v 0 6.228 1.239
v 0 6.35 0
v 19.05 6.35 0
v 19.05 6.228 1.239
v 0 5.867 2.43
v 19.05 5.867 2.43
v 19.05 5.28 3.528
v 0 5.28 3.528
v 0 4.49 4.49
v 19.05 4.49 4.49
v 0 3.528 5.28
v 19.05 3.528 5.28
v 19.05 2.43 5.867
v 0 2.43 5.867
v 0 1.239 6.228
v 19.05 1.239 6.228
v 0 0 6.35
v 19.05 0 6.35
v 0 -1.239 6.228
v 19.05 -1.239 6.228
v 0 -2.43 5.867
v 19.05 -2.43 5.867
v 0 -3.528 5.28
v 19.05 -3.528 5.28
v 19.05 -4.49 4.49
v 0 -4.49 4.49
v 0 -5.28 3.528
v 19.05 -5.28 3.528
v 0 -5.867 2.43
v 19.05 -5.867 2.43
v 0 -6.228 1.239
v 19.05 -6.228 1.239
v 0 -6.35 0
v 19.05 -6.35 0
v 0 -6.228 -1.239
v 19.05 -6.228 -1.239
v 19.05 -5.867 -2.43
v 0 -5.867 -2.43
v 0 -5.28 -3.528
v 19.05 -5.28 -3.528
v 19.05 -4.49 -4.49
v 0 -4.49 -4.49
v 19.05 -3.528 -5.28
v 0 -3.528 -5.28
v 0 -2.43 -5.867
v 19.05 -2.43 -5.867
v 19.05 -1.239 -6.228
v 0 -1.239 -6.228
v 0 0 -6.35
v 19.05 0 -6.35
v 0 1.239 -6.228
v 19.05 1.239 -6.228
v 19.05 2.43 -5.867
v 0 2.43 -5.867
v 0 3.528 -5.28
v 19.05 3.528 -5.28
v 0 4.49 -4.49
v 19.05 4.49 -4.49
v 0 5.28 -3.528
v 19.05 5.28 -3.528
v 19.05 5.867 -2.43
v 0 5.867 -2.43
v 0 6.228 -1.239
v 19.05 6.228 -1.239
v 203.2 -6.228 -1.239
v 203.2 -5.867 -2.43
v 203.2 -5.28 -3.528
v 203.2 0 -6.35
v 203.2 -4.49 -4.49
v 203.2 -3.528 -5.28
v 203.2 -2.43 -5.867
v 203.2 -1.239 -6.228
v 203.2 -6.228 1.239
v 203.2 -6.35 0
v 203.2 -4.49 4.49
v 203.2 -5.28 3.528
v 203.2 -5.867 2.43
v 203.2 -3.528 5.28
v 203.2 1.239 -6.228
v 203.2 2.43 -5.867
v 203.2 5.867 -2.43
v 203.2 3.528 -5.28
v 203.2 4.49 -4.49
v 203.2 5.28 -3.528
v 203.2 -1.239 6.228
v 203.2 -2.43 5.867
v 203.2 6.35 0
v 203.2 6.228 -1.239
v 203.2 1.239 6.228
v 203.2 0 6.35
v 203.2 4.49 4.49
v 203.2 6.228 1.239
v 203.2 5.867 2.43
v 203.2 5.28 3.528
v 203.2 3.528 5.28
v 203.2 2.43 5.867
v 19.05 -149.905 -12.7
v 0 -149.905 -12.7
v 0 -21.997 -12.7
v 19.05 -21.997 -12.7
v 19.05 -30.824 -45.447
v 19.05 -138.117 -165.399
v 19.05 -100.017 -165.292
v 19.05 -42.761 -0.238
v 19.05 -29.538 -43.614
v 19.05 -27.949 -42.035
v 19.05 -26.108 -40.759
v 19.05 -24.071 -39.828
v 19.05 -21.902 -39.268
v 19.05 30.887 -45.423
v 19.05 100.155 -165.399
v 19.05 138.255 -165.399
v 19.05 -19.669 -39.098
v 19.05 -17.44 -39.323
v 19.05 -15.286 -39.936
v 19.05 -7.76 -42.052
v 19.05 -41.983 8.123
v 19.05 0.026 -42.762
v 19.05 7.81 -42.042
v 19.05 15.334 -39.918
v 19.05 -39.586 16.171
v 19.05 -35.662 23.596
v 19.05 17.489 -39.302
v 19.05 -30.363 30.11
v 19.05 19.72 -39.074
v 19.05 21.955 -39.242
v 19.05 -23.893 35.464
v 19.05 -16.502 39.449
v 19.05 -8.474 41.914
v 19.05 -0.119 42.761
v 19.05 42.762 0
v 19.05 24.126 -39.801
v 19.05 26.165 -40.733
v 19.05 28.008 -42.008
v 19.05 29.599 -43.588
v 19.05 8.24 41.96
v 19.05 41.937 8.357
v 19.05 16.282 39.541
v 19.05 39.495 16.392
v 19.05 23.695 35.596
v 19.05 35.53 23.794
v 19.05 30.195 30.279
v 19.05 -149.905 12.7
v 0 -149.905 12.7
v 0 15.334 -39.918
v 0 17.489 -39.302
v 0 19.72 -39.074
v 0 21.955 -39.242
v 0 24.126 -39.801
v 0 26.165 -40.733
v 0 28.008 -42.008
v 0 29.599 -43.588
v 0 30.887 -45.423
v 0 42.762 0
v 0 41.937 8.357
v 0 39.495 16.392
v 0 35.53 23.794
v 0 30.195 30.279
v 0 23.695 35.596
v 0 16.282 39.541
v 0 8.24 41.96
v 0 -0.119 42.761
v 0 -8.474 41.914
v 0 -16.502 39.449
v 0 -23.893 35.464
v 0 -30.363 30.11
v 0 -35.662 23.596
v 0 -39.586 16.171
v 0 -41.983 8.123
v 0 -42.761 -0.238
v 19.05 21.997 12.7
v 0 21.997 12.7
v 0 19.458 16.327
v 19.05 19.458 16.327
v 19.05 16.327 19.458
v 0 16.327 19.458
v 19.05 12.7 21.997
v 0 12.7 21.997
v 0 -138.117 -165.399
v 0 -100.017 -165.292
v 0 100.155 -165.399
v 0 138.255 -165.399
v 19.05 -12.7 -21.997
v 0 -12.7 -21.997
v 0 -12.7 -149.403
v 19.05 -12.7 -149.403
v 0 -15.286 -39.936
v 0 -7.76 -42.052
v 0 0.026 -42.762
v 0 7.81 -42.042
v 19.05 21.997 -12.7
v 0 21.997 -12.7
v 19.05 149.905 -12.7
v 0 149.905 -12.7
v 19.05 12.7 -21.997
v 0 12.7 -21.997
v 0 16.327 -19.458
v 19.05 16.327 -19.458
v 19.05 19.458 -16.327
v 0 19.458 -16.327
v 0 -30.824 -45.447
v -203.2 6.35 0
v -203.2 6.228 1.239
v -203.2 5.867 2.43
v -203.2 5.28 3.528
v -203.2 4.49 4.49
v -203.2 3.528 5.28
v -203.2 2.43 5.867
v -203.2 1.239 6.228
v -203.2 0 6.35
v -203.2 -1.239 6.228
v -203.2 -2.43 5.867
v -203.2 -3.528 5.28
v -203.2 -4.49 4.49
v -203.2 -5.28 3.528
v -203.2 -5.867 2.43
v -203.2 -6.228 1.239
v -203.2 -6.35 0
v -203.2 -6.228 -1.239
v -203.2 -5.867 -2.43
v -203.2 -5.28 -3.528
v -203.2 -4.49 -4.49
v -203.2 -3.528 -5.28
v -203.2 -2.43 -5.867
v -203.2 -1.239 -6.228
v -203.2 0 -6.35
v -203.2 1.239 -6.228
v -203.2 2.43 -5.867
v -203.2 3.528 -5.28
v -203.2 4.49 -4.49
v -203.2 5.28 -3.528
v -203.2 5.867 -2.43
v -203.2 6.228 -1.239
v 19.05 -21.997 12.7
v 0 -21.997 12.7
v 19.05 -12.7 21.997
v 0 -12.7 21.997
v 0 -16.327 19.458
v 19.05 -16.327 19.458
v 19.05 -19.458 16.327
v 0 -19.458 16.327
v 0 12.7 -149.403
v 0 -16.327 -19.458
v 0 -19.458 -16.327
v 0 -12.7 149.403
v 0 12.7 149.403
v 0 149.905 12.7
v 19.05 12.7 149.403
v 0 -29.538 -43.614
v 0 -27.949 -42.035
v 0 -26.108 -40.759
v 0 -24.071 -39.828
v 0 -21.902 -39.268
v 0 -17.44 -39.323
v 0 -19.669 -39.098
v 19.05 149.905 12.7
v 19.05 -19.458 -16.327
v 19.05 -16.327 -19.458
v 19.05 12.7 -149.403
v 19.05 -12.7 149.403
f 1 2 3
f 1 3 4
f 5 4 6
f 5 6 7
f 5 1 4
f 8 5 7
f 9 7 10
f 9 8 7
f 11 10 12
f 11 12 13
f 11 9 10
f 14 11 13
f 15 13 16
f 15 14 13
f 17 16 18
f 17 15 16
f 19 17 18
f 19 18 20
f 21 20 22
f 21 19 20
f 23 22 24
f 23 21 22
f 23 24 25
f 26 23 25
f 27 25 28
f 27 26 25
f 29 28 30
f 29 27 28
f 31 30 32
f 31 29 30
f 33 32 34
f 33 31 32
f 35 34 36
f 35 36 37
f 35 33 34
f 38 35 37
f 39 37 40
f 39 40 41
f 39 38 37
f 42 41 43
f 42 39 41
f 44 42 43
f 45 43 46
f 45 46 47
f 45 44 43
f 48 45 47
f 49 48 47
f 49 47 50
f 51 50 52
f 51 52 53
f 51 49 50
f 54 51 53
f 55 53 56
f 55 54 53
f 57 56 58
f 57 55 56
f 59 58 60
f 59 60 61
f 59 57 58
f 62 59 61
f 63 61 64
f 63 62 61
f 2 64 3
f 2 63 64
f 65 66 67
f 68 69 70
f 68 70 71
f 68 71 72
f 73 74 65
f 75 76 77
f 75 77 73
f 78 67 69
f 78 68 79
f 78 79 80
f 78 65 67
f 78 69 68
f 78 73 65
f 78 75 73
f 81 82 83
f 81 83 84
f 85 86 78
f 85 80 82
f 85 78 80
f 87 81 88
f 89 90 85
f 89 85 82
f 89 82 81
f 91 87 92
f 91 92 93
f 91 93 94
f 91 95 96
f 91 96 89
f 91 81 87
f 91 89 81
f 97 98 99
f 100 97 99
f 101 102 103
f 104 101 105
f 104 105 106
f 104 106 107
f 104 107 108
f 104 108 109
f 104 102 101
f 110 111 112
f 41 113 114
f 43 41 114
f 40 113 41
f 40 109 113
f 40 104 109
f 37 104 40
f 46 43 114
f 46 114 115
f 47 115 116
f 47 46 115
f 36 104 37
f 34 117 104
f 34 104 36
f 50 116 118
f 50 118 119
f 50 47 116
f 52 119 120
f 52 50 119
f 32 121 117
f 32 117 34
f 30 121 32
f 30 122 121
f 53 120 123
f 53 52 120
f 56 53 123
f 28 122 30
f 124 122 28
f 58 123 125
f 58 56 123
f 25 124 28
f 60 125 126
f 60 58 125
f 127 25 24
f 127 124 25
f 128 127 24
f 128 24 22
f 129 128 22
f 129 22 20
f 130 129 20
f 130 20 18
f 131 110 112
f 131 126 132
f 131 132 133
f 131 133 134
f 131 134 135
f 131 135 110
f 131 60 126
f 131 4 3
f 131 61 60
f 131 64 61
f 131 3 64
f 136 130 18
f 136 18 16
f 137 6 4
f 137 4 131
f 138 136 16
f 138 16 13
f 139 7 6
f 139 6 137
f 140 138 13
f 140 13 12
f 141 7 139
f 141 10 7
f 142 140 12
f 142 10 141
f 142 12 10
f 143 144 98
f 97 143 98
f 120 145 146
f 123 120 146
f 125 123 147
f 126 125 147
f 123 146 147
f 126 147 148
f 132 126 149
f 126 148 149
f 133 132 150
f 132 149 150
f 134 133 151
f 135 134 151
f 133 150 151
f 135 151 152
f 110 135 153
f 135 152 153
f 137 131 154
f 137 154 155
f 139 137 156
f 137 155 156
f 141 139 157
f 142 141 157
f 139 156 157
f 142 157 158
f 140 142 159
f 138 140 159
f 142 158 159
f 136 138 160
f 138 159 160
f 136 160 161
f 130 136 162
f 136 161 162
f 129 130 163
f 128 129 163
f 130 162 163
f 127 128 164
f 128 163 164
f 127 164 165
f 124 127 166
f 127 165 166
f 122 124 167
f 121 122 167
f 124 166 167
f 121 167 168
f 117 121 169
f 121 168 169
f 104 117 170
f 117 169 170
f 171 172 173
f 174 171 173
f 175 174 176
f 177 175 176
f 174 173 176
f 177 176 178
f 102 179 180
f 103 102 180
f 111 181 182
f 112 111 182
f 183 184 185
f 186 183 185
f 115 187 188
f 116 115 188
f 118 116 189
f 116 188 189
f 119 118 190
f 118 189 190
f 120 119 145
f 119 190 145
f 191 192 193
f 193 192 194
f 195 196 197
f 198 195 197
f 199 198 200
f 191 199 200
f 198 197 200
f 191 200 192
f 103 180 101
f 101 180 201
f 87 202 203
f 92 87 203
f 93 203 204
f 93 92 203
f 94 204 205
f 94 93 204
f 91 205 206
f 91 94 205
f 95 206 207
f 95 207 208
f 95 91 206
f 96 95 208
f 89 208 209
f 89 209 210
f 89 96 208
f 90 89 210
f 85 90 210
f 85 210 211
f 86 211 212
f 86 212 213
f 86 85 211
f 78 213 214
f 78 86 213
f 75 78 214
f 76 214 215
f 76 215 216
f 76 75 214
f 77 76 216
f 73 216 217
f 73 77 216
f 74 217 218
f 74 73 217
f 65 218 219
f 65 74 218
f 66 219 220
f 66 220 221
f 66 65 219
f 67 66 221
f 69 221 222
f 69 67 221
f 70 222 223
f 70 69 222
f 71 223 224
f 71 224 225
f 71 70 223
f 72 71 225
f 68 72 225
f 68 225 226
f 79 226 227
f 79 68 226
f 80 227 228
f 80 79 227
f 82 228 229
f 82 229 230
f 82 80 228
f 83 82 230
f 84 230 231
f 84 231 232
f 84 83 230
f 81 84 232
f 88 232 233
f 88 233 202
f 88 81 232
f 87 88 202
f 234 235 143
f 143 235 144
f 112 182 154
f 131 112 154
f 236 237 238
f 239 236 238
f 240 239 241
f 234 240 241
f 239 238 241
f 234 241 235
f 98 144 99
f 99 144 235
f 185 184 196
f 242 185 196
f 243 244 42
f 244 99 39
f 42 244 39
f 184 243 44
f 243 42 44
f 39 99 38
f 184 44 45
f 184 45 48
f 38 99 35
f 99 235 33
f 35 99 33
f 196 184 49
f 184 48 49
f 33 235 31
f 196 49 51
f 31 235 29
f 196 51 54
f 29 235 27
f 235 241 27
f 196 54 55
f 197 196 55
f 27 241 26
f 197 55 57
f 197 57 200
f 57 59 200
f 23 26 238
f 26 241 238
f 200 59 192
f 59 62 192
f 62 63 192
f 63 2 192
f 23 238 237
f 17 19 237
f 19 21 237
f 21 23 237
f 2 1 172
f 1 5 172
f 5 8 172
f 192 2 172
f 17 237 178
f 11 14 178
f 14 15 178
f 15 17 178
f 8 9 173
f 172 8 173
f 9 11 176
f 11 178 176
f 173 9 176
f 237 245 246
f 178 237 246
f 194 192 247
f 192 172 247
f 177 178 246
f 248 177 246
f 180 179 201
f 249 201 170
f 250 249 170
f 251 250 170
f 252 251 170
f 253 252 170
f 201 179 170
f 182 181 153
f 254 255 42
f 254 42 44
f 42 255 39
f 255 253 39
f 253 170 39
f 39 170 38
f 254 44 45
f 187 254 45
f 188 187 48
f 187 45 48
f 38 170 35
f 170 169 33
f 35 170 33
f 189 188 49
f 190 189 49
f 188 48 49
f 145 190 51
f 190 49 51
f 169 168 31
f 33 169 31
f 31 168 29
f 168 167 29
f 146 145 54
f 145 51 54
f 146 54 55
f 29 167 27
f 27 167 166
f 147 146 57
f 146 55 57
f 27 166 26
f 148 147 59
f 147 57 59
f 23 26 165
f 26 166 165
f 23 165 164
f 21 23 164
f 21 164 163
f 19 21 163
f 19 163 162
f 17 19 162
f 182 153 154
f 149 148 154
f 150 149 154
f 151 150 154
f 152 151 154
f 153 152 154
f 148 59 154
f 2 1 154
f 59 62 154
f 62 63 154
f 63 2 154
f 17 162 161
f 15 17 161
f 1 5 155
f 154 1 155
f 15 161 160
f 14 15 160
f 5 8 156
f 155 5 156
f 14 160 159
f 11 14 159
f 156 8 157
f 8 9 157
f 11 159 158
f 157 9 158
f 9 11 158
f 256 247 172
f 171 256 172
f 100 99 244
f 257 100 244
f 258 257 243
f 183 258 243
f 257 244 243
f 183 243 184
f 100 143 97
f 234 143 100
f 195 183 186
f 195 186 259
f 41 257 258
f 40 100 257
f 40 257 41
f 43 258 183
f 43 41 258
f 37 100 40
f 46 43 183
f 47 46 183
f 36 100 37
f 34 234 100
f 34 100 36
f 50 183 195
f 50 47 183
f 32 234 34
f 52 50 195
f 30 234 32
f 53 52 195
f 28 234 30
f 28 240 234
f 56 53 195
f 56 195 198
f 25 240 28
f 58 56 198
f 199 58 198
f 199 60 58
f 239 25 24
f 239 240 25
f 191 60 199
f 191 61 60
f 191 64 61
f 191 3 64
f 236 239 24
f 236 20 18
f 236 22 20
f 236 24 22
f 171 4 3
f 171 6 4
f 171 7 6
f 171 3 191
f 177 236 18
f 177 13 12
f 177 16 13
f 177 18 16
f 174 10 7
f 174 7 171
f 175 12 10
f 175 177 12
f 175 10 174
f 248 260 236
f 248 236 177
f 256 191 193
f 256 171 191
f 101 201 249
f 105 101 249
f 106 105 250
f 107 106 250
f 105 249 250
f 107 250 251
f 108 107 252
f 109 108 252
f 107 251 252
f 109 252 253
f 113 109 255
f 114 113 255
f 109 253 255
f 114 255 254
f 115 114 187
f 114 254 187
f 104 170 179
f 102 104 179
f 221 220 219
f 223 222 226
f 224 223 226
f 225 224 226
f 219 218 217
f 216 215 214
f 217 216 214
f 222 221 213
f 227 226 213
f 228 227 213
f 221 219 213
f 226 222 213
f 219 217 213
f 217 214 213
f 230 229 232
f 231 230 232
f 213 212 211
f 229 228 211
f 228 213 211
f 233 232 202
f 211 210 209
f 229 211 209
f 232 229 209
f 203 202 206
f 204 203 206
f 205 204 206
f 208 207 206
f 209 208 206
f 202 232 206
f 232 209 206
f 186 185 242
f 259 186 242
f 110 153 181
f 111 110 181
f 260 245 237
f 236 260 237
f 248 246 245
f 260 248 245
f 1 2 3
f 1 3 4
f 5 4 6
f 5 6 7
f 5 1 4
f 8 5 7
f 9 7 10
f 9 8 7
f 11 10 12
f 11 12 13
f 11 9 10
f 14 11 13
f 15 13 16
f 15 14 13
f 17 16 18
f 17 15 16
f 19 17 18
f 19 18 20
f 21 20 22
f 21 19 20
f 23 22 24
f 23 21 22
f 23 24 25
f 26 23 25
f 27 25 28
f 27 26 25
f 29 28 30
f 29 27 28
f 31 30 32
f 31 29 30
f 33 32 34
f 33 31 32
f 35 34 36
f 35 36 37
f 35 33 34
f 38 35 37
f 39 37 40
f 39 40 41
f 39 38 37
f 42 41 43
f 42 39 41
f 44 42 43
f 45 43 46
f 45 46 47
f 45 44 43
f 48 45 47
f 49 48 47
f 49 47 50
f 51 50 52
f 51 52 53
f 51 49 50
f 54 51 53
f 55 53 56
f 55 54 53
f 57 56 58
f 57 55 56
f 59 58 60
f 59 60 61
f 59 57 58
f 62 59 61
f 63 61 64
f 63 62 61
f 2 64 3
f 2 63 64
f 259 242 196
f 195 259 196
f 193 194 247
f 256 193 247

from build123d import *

# Parameters (mm, degrees)
F1_R     = 6.35
F2_DEPTH = 19.05
F3_R     = 6.35
F4_DEPTH = 203.2
F5_R     = 6.35
F6_DEPTH = 19.05


with BuildPart() as f2:
    # F1 (on Right) → F2 (new body)
    with BuildSketch(Plane.YZ):
        with BuildLine():
            Line((-12.7, 149.403349), (-12.7, 21.997045))
            ThreePointArc((-12.7, 21.997045), (-17.960512, 17.960512), (-21.997045, 12.7))
            Line((-21.997045, 12.7), (-149.904549, 12.7))
            Line((-149.904549, 12.7), (-149.904549, -12.7))
            Line((-149.904549, -12.7), (-21.997045, -12.7))
            ThreePointArc((-21.997045, -12.7), (-17.960512, -17.960512), (-12.7, -21.997045))
            Line((-12.7, -21.997045), (-12.7, -149.403349))
            Line((-12.7, -149.403349), (12.7, -149.403349))
            Line((12.7, -149.403349), (12.7, -21.997045))
            ThreePointArc((12.7, -21.997045), (17.960512, -17.960512), (21.997045, -12.7))
            Line((21.997045, -12.7), (149.904549, -12.7))
            Line((149.904549, -12.7), (149.904549, 12.7))
            Line((149.904549, 12.7), (21.997045, 12.7))
            ThreePointArc((21.997045, 12.7), (17.960512, 17.960512), (12.7, 21.997045))
            Line((12.7, 21.997045), (12.7, 149.403349))
            Line((12.7, 149.403349), (-12.7, 149.403349))
        make_face()
        Circle(F1_R, mode=Mode.SUBTRACT)
    extrude(amount=F2_DEPTH)


with BuildPart() as f4:
    # F3 (on face) → F4 (new body, symmetric)
    with BuildSketch(Plane.YZ):
        Circle(F3_R)
    extrude(amount=F4_DEPTH, both=True)


with BuildPart() as f6:
    # F5 (on Right) → F6 (new body)
    with BuildSketch(Plane.YZ):
        with BuildLine():
            ThreePointArc((-30.82442, -45.447008), (-24.070998, -39.8275), (-15.286024, -39.936166))
            ThreePointArc((-15.286024, -39.936166), (0.02572, -42.761656), (15.334055, -39.917749))
            ThreePointArc((15.334055, -39.917749), (24.126093, -39.801061), (30.886715, -45.42312))
            Line((30.886715, -45.42312), (100.155028, -165.399358))
            Line((100.155028, -165.399358), (138.255028, -165.399358))
            Line((138.255028, -165.399358), (42.761664, 0))
            ThreePointArc((42.761664, 0), (-0.11923, 42.761498), (-42.760999, -0.238459))
            Line((-42.760999, -0.238459), (-138.116688, -165.399358))
            Line((-138.116688, -165.399358), (-100.016688, -165.291533))
            Line((-100.016688, -165.291533), (-30.82442, -45.447008))
        make_face()
        Circle(F5_R, mode=Mode.SUBTRACT)
    extrude(amount=F6_DEPTH)


solid = Compound([f2.part, f4.part, f6.part])
